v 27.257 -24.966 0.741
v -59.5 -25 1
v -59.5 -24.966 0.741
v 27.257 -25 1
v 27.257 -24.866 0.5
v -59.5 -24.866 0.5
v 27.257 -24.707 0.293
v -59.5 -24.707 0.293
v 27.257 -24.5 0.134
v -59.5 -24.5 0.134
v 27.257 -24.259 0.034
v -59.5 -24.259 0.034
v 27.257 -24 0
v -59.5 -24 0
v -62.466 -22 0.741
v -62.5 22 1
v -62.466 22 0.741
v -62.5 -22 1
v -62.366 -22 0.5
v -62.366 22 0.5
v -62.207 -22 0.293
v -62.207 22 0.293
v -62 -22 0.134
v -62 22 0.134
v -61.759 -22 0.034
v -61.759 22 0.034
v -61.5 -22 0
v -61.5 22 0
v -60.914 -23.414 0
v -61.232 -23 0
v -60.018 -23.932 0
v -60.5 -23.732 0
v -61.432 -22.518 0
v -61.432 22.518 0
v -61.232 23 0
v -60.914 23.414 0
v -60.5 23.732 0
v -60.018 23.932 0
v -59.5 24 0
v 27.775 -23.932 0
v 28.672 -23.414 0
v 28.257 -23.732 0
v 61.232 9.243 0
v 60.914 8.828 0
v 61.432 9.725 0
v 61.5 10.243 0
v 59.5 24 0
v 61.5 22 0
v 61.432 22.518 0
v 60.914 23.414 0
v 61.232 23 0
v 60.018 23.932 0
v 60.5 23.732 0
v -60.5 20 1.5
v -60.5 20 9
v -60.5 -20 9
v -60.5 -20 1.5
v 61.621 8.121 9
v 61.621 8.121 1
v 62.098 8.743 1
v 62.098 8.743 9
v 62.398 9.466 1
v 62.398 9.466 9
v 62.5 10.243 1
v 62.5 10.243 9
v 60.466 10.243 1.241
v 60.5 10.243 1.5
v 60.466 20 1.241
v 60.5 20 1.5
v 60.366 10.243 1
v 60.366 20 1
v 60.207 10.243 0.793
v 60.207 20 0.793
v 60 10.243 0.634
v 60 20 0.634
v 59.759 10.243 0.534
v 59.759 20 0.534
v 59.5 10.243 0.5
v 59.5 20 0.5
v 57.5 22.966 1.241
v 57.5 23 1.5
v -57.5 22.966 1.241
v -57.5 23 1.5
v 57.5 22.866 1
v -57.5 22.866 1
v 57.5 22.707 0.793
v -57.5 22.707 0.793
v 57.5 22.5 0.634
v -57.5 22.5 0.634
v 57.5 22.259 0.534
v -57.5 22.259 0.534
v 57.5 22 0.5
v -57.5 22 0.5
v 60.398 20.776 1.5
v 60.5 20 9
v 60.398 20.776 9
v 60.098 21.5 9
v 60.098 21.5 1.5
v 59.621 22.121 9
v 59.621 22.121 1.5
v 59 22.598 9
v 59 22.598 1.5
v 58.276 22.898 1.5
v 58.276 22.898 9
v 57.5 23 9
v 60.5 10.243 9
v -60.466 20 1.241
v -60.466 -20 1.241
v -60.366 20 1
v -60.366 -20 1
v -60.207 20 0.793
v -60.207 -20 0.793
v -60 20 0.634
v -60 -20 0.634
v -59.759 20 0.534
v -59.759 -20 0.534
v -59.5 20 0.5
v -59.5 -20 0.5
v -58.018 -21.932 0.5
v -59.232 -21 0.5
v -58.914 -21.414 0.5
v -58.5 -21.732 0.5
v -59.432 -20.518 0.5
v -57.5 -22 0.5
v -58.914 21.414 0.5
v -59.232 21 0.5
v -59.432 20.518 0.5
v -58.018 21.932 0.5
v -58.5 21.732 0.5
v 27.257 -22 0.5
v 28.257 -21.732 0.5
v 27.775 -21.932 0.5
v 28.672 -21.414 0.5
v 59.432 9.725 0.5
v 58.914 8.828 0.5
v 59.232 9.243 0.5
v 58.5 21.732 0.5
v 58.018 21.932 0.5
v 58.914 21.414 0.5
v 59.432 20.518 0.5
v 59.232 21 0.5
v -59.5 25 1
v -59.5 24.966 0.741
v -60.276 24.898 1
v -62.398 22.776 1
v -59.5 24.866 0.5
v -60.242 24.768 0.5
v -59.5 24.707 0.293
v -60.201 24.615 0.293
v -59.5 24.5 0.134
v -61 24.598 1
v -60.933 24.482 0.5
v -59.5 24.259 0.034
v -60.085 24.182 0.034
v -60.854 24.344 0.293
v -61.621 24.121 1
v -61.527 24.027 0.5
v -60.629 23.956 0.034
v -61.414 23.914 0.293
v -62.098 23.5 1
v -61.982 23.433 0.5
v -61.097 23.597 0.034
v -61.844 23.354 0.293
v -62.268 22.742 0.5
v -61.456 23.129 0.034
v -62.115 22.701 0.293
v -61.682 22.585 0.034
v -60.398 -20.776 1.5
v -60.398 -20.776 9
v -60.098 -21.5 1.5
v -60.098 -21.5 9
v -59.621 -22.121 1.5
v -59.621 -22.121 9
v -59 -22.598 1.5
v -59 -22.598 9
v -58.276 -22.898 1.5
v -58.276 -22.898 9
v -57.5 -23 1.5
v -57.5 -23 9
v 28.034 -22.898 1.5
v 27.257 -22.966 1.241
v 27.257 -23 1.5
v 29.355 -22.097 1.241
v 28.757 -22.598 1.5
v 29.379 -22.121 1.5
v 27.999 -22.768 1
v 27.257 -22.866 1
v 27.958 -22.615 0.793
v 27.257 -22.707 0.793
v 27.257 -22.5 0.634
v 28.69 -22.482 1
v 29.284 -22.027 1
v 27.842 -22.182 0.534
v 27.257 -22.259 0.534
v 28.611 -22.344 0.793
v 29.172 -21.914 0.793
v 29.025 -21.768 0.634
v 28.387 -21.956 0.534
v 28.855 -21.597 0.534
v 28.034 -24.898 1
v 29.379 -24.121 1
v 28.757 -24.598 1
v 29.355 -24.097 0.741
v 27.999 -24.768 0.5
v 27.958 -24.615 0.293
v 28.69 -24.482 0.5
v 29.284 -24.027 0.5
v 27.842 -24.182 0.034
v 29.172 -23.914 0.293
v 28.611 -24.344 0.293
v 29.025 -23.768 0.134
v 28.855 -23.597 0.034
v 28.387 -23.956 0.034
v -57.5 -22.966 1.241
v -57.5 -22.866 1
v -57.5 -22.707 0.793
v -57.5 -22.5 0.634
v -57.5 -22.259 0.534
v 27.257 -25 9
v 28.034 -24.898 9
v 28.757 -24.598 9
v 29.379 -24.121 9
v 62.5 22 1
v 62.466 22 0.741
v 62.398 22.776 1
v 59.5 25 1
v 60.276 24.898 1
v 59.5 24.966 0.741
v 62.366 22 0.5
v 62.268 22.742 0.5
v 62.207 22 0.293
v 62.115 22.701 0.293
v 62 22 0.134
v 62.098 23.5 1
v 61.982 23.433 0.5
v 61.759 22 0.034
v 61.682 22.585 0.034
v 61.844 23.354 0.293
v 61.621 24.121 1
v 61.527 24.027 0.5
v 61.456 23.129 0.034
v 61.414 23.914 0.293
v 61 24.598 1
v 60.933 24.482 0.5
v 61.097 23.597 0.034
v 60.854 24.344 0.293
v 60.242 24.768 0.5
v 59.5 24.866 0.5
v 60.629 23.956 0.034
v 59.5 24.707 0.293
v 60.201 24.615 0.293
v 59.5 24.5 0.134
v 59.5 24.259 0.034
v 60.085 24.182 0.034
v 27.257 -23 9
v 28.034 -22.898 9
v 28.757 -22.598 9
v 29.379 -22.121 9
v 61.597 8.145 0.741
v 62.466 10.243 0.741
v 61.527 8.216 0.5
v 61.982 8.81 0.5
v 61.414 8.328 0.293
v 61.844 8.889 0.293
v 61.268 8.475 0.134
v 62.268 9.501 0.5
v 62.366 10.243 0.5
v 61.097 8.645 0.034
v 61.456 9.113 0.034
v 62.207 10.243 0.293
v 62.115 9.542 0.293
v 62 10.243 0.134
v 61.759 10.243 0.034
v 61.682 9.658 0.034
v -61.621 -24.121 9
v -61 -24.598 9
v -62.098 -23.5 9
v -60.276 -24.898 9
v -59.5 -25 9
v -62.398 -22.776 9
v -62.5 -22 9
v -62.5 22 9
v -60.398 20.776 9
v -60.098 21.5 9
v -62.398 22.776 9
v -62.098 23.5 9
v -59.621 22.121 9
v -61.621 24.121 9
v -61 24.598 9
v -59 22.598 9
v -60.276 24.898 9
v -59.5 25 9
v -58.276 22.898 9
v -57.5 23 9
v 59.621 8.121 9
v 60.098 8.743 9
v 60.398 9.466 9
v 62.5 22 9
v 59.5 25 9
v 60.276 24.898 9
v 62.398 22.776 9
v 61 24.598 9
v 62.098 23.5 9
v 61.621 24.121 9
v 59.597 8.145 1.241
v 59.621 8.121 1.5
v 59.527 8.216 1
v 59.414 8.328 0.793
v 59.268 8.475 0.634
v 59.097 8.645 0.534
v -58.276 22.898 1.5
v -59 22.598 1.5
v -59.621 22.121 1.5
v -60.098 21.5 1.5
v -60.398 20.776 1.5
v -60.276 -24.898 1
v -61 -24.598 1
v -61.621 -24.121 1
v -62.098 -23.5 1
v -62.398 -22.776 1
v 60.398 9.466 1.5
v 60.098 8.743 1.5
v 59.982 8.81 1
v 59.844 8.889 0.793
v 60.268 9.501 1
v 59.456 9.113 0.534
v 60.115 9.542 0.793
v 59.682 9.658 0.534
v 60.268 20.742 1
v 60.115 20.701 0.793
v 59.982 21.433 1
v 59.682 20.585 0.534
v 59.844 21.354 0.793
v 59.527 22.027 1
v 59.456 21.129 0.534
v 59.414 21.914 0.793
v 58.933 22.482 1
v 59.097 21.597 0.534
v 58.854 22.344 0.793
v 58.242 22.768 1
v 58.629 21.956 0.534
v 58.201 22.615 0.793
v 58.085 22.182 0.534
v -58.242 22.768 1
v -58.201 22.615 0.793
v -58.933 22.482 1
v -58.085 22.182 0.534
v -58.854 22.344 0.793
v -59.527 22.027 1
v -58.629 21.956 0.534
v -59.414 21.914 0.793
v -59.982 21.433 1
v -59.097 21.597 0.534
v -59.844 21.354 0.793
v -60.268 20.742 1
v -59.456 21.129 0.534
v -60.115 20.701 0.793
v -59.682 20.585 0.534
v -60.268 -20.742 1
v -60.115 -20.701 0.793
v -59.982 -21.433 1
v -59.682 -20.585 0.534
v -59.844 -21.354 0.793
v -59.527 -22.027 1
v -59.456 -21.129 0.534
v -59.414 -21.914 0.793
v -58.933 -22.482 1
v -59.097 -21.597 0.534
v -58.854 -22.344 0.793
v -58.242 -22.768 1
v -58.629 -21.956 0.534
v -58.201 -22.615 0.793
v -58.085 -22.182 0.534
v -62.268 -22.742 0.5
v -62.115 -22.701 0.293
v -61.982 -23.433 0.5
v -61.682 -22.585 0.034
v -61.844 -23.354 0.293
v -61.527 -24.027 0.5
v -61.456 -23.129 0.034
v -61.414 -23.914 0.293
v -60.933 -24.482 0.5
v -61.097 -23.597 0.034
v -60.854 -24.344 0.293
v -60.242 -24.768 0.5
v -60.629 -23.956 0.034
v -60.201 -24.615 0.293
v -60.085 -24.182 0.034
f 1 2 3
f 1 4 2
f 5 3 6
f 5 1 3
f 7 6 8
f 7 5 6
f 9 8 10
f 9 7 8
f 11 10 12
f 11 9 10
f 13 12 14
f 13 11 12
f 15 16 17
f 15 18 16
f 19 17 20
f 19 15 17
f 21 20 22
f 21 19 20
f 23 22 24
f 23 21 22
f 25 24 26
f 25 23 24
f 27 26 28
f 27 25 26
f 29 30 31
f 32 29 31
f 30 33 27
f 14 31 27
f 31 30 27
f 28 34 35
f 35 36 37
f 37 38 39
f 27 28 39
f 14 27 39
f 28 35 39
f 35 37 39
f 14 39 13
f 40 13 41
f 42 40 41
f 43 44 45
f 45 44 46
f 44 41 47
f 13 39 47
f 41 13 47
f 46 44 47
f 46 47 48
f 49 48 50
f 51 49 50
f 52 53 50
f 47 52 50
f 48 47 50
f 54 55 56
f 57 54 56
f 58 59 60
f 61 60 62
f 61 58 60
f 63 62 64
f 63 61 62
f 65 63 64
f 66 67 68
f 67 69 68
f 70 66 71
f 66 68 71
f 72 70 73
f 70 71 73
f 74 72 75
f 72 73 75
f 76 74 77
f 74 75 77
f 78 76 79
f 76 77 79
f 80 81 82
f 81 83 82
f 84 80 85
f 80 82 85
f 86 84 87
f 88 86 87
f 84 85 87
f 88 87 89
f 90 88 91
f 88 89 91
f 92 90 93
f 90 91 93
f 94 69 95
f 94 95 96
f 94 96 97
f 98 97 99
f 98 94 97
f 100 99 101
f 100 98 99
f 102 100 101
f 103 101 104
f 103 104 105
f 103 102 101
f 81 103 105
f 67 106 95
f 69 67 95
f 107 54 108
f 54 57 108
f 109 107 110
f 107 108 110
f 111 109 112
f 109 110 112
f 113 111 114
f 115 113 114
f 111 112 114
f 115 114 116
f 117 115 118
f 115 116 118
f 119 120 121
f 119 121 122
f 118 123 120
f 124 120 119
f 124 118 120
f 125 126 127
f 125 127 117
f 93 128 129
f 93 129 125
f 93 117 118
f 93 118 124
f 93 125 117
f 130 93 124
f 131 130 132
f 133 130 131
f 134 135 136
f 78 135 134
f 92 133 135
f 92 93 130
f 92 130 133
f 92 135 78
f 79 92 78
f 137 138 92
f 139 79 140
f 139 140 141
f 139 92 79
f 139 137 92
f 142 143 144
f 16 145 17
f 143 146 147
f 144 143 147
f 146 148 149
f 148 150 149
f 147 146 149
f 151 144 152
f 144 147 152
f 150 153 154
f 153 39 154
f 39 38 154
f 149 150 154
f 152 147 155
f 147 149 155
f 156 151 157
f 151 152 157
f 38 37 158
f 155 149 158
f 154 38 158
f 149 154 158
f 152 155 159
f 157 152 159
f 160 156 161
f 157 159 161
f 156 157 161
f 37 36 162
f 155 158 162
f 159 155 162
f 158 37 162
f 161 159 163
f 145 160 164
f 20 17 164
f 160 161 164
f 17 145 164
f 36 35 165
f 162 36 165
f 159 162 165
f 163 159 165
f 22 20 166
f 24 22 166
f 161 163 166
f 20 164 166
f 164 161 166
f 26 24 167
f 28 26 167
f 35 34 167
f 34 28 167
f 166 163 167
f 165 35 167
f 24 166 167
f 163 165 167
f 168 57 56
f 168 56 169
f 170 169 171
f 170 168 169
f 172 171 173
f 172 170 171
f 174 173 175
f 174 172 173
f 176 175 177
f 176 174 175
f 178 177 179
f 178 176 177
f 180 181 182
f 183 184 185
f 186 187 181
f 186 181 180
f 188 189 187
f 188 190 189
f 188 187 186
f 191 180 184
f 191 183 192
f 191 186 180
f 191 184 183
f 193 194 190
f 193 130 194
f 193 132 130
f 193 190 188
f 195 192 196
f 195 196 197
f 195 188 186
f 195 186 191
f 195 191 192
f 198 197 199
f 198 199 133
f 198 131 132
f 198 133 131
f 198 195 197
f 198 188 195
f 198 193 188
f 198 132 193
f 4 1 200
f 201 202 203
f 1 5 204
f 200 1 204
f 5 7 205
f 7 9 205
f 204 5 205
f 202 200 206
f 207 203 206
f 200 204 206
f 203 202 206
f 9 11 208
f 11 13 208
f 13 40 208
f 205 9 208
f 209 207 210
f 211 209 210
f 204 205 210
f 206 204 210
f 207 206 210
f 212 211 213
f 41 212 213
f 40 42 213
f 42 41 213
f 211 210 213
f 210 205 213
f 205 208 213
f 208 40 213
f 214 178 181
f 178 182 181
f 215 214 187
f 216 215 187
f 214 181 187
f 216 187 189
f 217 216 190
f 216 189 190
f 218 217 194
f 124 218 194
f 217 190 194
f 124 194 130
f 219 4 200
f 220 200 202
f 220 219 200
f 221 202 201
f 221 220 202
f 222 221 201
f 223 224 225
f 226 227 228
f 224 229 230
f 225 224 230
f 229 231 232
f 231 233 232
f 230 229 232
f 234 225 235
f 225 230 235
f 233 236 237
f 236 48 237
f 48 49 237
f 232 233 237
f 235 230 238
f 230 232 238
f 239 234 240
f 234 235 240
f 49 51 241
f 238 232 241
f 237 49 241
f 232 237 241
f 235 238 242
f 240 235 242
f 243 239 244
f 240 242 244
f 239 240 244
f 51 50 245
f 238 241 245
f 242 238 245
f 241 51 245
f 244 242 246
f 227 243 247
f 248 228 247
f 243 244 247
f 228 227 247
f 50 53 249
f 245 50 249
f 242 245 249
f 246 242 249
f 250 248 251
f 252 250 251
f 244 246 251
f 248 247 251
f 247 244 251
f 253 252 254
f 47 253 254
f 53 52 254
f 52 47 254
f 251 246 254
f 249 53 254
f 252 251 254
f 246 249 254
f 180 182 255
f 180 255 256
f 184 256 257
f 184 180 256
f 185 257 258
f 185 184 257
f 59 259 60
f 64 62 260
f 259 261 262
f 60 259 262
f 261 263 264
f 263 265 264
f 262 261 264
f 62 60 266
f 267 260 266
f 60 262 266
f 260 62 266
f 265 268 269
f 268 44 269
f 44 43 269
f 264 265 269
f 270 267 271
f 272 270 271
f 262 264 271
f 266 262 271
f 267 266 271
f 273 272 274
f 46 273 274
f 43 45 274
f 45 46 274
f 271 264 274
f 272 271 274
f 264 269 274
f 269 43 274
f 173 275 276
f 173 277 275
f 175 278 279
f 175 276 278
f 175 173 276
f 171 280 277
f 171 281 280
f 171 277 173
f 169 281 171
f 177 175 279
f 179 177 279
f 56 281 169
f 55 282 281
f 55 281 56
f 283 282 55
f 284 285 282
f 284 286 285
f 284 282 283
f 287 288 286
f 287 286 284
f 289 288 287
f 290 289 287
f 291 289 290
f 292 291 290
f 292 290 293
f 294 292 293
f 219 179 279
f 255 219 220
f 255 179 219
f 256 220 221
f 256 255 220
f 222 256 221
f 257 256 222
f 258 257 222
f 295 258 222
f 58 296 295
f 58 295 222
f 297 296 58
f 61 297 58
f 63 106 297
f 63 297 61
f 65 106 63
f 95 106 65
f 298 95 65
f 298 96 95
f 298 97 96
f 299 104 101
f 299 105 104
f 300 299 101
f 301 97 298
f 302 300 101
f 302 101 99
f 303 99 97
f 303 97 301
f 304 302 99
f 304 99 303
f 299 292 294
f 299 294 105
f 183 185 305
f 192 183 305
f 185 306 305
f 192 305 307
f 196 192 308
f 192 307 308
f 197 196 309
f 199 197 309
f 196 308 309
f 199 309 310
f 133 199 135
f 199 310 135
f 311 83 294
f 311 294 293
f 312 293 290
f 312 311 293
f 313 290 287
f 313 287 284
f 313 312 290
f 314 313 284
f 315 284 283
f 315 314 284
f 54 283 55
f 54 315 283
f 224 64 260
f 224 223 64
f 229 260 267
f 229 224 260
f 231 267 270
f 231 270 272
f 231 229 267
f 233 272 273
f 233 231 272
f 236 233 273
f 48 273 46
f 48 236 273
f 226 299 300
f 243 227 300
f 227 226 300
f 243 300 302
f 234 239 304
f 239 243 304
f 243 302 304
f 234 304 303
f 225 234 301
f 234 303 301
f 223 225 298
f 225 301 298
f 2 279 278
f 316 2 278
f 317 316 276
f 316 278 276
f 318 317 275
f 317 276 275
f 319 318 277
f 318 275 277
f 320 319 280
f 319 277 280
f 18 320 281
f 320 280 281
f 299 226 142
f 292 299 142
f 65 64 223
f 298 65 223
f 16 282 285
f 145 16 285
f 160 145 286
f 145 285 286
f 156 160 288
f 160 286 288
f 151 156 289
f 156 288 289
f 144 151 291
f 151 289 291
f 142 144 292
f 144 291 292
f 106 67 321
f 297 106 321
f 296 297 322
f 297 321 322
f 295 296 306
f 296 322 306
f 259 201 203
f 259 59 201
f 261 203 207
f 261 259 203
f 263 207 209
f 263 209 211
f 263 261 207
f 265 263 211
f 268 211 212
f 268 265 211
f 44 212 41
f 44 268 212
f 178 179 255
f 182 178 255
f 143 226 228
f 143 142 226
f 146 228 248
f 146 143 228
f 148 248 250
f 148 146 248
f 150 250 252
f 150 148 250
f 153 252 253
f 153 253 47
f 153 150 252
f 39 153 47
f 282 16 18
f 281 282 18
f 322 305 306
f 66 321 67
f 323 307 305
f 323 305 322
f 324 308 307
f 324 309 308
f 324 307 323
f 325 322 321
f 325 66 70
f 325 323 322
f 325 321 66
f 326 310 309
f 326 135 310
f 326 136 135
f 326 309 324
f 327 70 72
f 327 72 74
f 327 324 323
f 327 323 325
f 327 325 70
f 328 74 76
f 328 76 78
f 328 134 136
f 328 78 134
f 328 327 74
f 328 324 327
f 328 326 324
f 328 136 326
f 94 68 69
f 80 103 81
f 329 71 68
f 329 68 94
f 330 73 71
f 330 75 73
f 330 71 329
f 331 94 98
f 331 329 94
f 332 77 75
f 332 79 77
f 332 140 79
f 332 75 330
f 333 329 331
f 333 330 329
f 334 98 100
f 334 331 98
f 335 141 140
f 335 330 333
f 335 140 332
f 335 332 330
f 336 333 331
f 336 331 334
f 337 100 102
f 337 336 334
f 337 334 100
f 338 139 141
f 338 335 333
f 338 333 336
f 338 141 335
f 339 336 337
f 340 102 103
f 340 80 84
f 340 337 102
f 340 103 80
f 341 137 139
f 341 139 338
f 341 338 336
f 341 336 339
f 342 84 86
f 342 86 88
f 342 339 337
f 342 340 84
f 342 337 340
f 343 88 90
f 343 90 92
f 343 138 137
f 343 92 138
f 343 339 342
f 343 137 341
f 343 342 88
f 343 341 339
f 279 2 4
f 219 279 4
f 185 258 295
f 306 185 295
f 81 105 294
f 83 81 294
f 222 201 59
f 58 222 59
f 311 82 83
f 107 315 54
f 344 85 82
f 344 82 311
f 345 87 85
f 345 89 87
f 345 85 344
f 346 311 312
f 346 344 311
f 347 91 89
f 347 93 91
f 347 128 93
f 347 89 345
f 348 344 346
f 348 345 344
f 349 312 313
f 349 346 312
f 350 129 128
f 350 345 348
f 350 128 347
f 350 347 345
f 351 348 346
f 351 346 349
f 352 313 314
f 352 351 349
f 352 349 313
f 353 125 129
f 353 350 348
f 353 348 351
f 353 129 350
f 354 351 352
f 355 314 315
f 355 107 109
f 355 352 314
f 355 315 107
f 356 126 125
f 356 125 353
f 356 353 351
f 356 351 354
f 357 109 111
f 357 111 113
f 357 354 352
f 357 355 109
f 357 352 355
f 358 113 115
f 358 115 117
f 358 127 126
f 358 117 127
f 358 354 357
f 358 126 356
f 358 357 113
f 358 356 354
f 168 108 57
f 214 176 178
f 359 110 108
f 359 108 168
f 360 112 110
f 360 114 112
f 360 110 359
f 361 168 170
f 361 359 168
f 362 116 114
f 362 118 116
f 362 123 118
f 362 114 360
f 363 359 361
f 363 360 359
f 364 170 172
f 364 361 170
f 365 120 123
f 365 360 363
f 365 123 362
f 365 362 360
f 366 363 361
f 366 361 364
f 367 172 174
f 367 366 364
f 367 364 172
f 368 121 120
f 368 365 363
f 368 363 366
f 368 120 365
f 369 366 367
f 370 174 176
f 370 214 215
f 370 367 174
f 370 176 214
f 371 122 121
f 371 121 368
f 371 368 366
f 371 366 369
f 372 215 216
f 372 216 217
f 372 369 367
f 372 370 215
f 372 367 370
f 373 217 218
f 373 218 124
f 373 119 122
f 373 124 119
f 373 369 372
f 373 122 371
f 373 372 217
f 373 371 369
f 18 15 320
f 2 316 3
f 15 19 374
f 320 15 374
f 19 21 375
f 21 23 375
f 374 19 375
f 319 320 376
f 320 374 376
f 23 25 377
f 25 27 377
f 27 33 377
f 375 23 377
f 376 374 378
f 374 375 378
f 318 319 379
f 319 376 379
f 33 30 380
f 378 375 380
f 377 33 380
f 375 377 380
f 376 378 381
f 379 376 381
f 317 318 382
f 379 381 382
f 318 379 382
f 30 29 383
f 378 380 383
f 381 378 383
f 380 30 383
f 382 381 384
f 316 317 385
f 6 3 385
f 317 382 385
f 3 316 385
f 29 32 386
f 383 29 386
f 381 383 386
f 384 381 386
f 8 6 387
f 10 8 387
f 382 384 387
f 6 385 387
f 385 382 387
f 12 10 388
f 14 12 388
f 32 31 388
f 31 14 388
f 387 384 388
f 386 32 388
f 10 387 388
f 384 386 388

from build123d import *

# Parameters (mm, degrees)
F1_DEPTH = 9
F3_DEPTH = 8.5
F4_R     = 3
F5_R     = 1


# Not quite as in the source:
# - a feature names something its author has since deleted; it is built from what else it names


with BuildPart() as f1:
    # F0 (on Top) → F1 (new body)
    with BuildSketch(Plane.XY):
        Polygon((-62.5, -25), (28.5, -25), (62.5, 9), (62.5, 25), (-62.5, 25), align=None)
    extrude(amount=F1_DEPTH)

    # F2 (on face) → F3 (cut)
    with BuildSketch(Plane.XY.offset(9)):
        Polygon((60.5, 9), (60.5, 23), (-60.5, 23), (-60.5, -23), (28.5, -23), align=None)
    extrude(amount=-F3_DEPTH, mode=Mode.SUBTRACT)

    # F4
    f4_edges = [f1.edges().sort_by_distance(p)[0] for p in [
        (-60.5, 23, 4.75),
        (60.5, 23, 4.75),
        (60.5, 9, 4.75),
        (28.5, -23, 4.75),
        (-60.5, -23, 4.75),
        (62.5, 25, 4.5),
        (62.5, 9, 4.5),
        (28.5, -25, 4.5),
        (-62.5, 25, 4.5),
        (-62.5, -25, 4.5),
    ]]
    fillet(f4_edges, radius=F4_R)

    # F5
    f5_edges = [f1.edges().sort_by_distance(p)[0] for p in [
        (60.5, 15.12132, 0.5),
        (60.271639, 9.09459, 0.5),
        (59.62132, 22.12132, 0.5),
        (44.5, -7, 0.5),
        (0, 23, 0.5),
        (28.40541, -22.771639, 0.5),
        (-59.62132, 22.12132, 0.5),
        (-15.12132, -23, 0.5),
        (-60.5, 0, 0.5),
        (-59.62132, -22.12132, 0.5),
        (-16.12132, -25, 0),
        (-61.62132, -24.12132, 0),
        (28.40541, -24.771639, 0),
        (-62.5, 0, 0),
        (45.5, -8, 0),
        (-61.62132, 24.12132, 0),
        (62.271639, 9.09459, 0),
        (0, 25, 0),
        (62.5, 16.12132, 0),
        (61.62132, 24.12132, 0),
    ]]
    fillet(f5_edges, radius=F5_R)


solid = f1.part
